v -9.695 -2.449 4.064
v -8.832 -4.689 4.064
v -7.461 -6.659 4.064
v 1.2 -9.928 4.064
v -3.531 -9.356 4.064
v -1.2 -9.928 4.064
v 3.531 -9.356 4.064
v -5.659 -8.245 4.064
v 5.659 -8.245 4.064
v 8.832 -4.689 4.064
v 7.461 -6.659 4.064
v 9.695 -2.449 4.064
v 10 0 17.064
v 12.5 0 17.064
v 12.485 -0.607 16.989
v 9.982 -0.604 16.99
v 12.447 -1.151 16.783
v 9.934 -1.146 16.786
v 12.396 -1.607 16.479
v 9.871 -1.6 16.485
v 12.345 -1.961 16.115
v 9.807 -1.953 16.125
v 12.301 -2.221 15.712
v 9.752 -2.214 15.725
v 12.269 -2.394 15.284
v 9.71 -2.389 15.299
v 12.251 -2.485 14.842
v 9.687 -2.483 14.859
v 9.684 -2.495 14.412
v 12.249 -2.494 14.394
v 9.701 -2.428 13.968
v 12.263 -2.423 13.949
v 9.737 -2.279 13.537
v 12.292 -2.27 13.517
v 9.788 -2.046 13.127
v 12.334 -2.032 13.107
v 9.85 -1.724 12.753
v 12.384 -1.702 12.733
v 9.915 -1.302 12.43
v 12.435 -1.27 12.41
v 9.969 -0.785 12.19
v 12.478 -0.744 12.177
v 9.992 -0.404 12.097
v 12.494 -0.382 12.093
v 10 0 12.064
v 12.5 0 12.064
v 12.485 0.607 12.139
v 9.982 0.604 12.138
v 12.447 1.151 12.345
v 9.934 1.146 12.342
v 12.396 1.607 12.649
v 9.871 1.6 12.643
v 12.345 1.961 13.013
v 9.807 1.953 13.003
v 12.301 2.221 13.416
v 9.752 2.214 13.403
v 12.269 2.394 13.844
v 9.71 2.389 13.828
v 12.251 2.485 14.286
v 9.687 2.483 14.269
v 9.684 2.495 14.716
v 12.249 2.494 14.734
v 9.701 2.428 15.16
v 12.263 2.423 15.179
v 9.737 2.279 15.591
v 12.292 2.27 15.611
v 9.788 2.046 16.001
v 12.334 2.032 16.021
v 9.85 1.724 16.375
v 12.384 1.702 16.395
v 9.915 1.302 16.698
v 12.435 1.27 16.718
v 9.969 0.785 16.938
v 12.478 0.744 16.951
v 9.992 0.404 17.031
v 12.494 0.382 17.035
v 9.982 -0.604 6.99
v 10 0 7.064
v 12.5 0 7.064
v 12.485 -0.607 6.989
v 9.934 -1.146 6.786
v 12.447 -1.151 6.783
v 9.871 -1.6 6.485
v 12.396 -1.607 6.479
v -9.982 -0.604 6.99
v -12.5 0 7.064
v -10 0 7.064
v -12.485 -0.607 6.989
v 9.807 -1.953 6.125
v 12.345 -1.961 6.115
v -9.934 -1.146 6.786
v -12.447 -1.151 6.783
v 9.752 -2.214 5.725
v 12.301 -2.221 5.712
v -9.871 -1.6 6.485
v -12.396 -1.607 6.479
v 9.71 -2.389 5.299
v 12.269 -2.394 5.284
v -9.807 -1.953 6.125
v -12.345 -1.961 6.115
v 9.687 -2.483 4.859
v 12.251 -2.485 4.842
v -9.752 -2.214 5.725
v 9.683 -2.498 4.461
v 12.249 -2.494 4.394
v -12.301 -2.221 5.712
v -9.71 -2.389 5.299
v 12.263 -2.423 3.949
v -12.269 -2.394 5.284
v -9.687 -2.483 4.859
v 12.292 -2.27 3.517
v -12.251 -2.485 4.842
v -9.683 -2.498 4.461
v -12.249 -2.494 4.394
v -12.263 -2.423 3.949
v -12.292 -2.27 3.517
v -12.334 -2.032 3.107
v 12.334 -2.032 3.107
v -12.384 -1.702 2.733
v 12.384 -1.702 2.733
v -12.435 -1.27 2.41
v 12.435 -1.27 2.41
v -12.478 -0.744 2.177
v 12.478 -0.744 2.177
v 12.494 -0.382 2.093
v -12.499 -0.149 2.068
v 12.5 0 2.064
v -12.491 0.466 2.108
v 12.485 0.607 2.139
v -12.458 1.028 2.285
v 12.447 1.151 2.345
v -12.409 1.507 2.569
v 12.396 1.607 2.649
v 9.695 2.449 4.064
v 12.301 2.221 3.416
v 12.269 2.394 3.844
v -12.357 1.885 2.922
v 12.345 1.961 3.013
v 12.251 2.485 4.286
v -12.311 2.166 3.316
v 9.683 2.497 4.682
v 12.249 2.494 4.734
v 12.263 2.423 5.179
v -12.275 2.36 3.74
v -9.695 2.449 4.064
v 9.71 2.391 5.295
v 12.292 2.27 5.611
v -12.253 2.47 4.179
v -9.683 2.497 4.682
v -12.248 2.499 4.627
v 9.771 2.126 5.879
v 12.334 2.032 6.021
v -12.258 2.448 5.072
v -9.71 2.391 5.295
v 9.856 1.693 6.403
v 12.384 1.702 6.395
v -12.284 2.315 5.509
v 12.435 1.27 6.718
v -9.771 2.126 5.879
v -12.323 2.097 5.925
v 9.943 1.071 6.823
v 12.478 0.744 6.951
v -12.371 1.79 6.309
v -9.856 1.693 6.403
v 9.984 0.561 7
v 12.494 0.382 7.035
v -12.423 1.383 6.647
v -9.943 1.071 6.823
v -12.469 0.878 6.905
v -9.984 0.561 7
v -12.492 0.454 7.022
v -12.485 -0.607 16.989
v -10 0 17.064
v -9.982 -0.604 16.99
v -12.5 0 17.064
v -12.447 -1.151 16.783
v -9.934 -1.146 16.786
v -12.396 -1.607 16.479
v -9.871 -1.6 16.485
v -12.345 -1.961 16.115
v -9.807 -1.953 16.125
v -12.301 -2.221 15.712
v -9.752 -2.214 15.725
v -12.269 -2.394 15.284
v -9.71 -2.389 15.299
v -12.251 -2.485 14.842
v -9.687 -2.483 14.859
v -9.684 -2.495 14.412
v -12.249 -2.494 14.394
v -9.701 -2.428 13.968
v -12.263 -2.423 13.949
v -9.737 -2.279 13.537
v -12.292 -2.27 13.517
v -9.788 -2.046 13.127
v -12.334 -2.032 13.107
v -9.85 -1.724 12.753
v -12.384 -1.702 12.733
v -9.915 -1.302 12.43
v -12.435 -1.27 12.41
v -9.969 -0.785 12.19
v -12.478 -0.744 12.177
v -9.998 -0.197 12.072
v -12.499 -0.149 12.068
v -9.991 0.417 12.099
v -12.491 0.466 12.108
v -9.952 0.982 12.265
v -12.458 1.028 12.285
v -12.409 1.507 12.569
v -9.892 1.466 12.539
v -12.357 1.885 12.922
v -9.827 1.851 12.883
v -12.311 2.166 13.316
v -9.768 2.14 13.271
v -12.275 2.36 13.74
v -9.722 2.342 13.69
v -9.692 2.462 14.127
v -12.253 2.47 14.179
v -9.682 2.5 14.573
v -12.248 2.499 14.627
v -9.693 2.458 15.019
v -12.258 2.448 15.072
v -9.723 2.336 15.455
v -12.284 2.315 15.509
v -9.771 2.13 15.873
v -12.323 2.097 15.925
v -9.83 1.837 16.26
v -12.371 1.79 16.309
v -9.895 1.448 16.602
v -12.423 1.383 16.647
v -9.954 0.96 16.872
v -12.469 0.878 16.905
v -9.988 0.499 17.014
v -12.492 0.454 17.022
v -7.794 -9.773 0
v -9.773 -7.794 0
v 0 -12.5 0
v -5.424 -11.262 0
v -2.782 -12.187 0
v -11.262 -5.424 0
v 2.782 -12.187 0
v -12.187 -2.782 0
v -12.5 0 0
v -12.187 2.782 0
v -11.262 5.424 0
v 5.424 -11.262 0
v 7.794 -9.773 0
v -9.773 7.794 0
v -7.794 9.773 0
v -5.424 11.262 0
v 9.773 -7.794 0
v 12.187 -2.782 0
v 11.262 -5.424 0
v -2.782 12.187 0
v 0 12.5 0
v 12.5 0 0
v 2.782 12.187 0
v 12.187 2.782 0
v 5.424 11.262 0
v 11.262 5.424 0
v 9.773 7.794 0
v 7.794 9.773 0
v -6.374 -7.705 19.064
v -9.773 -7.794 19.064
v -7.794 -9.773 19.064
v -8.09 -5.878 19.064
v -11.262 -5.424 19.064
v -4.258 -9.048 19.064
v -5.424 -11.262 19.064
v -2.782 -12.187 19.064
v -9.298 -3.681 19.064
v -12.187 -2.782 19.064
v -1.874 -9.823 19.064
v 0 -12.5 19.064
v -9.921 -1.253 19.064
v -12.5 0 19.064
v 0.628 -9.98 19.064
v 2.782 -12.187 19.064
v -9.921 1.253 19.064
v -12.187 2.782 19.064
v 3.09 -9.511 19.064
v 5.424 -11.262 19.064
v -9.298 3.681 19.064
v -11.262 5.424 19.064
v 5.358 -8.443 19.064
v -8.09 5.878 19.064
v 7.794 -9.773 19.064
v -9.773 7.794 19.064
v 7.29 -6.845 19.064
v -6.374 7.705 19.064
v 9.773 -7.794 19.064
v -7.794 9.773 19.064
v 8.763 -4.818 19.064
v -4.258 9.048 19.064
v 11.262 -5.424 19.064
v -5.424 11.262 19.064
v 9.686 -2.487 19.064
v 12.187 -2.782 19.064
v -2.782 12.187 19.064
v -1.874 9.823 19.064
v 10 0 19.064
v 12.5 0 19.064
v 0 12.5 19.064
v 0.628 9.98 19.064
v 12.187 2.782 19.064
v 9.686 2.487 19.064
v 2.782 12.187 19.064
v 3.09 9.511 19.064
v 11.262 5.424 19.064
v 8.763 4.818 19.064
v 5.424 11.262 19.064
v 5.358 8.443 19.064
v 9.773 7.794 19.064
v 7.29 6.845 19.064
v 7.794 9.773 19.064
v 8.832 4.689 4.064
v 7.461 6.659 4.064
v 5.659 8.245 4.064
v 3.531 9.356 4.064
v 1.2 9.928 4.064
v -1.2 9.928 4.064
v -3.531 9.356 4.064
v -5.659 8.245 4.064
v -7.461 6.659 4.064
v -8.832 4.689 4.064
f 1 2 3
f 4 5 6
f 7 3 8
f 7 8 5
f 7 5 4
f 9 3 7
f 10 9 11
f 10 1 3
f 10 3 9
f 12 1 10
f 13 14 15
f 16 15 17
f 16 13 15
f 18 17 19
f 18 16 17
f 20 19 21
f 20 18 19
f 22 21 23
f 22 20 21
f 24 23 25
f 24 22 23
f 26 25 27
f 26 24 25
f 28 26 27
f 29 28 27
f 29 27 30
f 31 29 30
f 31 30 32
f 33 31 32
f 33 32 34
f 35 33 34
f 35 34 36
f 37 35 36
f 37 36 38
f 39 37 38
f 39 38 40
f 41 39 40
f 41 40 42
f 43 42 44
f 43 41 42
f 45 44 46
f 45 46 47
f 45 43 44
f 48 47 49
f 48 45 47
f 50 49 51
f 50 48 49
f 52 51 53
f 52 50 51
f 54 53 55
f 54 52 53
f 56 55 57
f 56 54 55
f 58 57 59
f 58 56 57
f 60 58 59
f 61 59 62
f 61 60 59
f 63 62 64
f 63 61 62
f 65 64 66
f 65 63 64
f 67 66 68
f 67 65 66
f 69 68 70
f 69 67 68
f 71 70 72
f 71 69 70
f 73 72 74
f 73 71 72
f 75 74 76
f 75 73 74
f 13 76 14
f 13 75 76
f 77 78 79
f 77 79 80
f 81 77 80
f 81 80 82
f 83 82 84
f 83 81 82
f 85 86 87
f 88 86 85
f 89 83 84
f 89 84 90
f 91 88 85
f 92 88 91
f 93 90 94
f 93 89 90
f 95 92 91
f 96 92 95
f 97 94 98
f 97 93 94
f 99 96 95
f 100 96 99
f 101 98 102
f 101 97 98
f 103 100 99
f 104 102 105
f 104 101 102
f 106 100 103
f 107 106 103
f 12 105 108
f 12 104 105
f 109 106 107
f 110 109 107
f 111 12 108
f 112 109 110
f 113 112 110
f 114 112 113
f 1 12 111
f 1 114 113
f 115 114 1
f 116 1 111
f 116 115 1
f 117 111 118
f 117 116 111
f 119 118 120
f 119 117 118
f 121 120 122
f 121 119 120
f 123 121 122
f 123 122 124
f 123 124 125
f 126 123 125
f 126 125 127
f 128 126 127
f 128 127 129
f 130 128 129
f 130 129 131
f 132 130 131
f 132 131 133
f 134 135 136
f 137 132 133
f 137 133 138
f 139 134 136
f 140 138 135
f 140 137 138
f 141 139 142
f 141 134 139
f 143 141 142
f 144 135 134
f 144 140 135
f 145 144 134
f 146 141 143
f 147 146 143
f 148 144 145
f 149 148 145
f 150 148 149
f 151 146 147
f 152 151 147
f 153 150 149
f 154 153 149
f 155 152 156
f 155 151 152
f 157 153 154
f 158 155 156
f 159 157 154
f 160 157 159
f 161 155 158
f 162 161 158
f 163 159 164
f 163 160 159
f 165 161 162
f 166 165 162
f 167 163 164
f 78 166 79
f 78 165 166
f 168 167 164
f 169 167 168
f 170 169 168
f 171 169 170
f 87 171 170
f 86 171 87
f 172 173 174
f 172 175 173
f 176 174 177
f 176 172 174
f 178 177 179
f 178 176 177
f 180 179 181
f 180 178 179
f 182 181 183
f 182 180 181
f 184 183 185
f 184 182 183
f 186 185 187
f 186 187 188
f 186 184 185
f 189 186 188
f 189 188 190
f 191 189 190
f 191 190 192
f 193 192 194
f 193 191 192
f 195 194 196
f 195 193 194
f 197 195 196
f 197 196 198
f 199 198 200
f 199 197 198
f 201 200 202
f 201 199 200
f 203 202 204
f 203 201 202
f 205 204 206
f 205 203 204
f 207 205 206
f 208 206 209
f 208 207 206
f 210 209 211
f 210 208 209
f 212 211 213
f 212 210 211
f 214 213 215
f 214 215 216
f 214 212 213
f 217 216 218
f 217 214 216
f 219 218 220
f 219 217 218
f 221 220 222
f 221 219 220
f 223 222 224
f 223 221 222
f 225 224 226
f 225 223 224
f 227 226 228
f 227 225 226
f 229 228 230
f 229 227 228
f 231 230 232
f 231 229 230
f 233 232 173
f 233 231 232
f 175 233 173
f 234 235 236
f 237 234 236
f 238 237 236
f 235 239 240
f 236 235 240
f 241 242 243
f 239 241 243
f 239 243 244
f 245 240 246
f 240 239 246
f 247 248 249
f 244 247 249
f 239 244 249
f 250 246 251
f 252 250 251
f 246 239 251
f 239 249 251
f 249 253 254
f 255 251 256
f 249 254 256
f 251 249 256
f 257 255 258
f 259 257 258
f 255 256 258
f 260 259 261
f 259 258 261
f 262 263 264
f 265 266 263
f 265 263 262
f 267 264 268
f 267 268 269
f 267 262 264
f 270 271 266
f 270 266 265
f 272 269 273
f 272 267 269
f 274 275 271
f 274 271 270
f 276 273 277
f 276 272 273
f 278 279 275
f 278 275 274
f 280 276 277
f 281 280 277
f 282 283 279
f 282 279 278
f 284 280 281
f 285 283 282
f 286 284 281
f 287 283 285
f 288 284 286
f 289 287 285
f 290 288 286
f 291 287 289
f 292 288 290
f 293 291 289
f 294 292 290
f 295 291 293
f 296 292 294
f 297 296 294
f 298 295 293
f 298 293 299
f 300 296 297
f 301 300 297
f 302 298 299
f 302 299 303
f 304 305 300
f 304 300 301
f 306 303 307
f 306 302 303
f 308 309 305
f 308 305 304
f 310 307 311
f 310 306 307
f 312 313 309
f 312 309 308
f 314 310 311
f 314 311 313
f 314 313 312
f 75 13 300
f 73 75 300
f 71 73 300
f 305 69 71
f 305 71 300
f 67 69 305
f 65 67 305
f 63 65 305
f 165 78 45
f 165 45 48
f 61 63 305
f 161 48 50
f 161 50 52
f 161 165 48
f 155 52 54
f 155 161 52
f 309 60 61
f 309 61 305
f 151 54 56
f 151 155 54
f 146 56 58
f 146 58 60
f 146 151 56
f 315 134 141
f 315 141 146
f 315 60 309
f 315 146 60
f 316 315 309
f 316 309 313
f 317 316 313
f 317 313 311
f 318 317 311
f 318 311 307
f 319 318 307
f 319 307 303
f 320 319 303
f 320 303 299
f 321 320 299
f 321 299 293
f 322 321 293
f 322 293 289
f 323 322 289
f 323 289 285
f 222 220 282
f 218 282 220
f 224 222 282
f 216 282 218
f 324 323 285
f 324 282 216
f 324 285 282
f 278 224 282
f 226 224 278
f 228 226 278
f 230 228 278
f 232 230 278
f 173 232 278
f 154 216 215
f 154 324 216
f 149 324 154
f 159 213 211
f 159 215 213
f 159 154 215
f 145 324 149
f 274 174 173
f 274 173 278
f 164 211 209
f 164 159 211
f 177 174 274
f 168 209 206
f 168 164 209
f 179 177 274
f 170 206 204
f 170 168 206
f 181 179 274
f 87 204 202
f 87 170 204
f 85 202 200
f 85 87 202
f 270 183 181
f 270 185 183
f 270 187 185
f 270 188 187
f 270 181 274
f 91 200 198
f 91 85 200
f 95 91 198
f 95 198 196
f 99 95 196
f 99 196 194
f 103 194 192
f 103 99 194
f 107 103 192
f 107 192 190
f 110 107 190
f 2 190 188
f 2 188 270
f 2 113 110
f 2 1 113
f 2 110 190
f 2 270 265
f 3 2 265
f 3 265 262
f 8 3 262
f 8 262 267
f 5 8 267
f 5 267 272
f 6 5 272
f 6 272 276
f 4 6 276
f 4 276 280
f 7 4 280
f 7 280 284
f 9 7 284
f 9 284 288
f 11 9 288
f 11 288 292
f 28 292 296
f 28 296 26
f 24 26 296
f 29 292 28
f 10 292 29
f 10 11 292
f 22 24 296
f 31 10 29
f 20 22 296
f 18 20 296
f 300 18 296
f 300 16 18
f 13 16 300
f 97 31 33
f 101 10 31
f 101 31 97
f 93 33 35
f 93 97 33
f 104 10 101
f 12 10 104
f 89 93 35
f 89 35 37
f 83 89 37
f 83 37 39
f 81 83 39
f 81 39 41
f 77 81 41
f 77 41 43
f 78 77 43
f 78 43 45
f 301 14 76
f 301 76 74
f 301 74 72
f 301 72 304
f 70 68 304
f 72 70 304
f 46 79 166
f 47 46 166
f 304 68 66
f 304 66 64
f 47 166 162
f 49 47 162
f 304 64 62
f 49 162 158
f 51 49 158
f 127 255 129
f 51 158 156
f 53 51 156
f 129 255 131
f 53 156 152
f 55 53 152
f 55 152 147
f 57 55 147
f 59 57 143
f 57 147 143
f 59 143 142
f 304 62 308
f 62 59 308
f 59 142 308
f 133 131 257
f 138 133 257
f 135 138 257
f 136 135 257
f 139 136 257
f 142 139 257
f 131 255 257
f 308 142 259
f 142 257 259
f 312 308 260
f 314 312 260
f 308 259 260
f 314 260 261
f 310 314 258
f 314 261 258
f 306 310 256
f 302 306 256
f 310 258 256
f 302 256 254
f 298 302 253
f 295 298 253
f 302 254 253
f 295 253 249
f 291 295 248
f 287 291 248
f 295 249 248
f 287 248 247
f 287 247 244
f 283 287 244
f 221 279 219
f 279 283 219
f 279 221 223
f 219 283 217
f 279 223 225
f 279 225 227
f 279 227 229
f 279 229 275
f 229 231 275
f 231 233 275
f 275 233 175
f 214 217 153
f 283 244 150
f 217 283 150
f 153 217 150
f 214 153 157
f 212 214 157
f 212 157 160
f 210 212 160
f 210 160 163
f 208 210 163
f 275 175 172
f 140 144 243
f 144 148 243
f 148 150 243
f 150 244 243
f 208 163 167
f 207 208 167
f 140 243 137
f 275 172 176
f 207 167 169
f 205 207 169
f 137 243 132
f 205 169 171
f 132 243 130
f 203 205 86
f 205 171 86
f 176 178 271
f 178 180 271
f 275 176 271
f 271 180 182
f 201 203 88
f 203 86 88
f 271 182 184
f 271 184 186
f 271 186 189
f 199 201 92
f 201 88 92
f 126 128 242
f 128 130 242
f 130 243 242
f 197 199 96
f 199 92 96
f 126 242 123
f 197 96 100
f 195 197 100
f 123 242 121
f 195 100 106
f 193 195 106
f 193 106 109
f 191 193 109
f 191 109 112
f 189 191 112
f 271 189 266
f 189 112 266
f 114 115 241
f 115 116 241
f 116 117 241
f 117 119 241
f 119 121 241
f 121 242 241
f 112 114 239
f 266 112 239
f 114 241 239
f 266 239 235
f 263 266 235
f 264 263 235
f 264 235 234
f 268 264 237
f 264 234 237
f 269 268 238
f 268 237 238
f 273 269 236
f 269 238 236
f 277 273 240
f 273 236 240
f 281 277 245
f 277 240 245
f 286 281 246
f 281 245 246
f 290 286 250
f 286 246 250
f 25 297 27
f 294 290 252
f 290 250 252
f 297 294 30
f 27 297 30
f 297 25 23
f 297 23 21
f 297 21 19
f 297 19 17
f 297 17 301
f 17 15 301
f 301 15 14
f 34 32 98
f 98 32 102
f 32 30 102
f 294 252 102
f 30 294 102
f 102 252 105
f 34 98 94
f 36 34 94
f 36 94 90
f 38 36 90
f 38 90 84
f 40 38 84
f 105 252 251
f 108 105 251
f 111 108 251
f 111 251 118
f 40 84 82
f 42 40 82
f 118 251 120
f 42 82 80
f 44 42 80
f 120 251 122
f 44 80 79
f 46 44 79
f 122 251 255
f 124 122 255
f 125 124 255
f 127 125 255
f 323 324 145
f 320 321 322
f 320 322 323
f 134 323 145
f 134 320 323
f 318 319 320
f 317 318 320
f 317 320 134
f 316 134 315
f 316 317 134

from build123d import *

# Parameters (mm, degrees)
ESBO_O1_R                  = 12.5
RESSALTO_EXTRUS_O1_DEPTH   = 4.064
ESBO_O2_R                  = 12.5
ESBO_O2_R_2                = 10
RESSALTO_EXTRUS_O2_DEPTH   = 15
CORTE_EXTRUS_O1_DEPTH      = 24
CORTE_EXTRUS_O1_DEPTH_BACK = 23
ESBO_O3_R                  = 2.5


with BuildPart() as part:
    # Esboço1 → Ressalto-extrusão1 (new body)
    with BuildSketch(Plane.XY):
        Circle(ESBO_O1_R)
    extrude(amount=RESSALTO_EXTRUS_O1_DEPTH)

    # Esboço2 → Ressalto-extrusão2 (add)
    with BuildSketch(Plane.XY.offset(4.064)):
        Circle(ESBO_O2_R)
        Circle(ESBO_O2_R_2, mode=Mode.SUBTRACT)
    extrude(amount=RESSALTO_EXTRUS_O2_DEPTH)

    # Esboço3 → Corte-extrusão1 (cut, two sides: drawn at the far end of the back side and taken through both)
    with BuildSketch(Plane(origin=(0, 0, 0), x_dir=(0, 0, -1), z_dir=(1, 0, 0)).offset(-CORTE_EXTRUS_O1_DEPTH_BACK)):
        with Locations(Location((-14.564, 0, 0), (0, 0, 180))):
            Circle(ESBO_O3_R)
        with Locations(Location((-4.564, 0, 0), (0, 0, 180))):
            Circle(ESBO_O3_R)
    extrude(amount=CORTE_EXTRUS_O1_DEPTH + CORTE_EXTRUS_O1_DEPTH_BACK, mode=Mode.SUBTRACT)


solid = part.part
